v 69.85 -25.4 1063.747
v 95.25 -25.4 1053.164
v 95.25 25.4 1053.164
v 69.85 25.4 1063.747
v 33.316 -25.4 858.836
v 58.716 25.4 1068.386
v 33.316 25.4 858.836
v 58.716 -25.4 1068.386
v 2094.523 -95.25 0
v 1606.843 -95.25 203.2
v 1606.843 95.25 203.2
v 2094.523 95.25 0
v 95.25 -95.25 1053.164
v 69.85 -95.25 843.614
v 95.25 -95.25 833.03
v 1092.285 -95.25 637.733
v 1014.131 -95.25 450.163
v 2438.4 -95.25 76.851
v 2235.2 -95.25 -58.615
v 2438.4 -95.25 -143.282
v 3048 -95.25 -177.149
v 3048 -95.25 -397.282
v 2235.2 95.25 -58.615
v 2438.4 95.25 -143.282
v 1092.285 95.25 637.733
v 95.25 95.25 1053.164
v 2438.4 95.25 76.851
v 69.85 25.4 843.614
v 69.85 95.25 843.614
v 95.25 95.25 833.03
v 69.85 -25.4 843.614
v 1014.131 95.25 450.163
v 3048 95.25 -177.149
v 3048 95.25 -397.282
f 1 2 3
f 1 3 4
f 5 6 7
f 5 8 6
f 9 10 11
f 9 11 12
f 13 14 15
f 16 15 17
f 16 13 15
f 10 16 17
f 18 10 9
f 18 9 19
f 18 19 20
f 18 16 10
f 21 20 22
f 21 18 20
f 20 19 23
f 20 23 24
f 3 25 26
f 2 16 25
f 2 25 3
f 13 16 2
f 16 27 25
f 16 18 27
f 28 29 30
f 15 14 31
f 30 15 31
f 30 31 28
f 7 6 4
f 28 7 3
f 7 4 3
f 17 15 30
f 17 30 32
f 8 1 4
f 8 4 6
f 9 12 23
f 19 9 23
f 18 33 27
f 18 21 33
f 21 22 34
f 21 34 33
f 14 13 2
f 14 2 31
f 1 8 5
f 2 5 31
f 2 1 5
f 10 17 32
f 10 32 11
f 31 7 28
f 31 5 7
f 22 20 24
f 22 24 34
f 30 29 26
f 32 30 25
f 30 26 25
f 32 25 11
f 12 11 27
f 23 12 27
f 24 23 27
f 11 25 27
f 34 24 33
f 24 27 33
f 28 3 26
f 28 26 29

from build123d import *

# Parameters (mm, degrees)
F1_DEPTH = 95.25
F2_DEPTH = 25.4


with BuildPart() as f1:
    # F0 (on Front) → F1 (new body, symmetric)
    with BuildSketch(Plane.XZ):
        Polygon((1092.285037, 637.732517), (95.25, 1053.163782), (95.25, 833.030449), (1014.131191, 450.163286), align=None)
        Polygon((95.25, 833.030449), (95.25, 1053.163782), (69.85, 843.613782), align=None)
        Polygon((2438.4, 76.851282), (1092.285037, 637.732517), (1014.131191, 450.163286), (1606.843077, 203.2), (1820.203077, 114.3), (1850.683077, 101.6), (2094.523077, 0), (2235.2, -58.615385), (2438.4, -143.282051), align=None)
        Polygon((3048, -177.148718), (2438.4, 76.851282), (2438.4, -143.282051), (3048, -397.282051), align=None)
    extrude(amount=F1_DEPTH, both=True)

    # F0 (on Front) → F2 (join, symmetric)
    with BuildSketch(Plane.XZ):
        Polygon((69.85, 843.613782), (95.25, 1053.163782), (69.85, 1063.747115), align=None)
        Polygon((69.85, 1063.747115), (58.716269, 1068.38617), (33.316269, 858.83617), (69.85, 843.613782), align=None)
    extrude(amount=F2_DEPTH, both=True)


solid = f1.part
